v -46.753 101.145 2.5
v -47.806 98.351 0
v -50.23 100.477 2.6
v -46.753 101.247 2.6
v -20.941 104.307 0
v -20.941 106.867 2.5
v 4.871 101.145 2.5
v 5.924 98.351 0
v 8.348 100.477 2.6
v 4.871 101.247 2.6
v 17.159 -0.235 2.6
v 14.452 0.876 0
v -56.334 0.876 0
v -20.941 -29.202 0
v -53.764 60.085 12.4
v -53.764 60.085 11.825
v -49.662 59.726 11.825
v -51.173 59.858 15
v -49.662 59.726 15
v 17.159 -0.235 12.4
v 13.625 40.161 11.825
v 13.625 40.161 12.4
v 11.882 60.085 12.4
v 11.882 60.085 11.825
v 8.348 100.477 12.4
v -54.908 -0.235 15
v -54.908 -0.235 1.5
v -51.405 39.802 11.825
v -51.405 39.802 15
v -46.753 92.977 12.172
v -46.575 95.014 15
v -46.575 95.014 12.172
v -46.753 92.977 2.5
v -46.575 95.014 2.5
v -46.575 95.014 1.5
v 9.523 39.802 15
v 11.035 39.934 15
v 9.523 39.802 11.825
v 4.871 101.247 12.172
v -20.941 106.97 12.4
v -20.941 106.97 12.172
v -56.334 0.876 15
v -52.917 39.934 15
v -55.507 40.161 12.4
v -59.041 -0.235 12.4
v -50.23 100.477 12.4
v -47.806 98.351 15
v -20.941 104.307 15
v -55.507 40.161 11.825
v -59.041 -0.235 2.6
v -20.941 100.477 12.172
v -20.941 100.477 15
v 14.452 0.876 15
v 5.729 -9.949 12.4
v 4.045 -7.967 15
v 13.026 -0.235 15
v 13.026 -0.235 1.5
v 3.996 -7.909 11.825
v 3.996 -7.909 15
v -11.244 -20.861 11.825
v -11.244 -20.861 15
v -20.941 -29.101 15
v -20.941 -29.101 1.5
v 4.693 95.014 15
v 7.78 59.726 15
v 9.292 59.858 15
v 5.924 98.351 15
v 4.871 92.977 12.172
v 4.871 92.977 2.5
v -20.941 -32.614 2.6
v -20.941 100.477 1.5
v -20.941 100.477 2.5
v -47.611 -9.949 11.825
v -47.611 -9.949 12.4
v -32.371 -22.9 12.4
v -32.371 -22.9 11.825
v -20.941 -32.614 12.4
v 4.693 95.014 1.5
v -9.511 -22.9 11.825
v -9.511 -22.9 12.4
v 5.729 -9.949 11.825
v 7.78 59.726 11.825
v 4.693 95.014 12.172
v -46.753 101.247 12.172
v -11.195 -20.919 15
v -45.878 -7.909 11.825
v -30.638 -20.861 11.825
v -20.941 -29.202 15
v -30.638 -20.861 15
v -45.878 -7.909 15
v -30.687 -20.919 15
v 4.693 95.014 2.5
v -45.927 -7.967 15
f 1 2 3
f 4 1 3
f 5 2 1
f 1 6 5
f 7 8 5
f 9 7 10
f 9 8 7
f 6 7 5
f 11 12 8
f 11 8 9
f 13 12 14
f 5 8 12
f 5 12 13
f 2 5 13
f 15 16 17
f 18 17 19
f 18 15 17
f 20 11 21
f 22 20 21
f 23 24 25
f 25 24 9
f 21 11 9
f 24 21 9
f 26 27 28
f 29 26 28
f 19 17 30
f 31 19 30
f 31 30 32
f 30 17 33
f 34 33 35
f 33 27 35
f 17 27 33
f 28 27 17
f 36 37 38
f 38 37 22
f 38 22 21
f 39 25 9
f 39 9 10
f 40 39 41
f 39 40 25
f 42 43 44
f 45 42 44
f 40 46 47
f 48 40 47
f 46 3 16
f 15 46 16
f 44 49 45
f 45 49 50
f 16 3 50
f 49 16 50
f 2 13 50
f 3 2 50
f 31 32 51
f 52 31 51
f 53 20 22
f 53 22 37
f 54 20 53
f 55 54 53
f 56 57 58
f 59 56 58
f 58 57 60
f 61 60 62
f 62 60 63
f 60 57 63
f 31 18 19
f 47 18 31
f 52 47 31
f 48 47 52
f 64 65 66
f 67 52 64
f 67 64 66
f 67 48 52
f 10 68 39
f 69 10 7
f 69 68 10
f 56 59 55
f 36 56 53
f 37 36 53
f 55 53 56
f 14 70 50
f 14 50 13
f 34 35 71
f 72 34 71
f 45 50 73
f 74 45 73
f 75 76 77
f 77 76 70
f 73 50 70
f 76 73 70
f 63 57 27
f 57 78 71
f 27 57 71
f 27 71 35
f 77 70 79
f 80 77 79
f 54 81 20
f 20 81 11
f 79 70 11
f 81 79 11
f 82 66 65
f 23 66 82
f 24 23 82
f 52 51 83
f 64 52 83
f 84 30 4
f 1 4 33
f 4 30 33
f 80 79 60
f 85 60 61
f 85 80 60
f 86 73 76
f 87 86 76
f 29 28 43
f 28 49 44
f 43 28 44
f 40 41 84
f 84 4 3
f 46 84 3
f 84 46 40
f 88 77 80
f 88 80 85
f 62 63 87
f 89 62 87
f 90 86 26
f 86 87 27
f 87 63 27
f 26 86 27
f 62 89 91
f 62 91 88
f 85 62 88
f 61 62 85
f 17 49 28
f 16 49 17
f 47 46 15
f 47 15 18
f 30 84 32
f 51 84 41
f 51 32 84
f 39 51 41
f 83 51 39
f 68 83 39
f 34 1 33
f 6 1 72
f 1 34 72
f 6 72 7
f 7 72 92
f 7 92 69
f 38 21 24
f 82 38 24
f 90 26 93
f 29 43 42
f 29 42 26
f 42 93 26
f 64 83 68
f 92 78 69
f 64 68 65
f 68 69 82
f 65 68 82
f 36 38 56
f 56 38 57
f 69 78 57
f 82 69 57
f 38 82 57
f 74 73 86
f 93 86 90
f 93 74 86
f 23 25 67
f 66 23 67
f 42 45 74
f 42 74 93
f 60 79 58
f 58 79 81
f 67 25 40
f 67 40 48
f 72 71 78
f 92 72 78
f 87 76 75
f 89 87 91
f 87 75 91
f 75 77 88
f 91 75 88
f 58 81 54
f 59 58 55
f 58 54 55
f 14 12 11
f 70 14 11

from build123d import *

# Parameters (mm, degrees)
BOSS_EXTRUDE1_DEPTH = 15
BOSS_EXTRUDE2_DEPTH = 1.5
SKETCH4_W           = 51.62387155
SKETCH4_H           = 9.672418812
CUT_EXTRUDE2_DEPTH  = 144.5
SKETCH9_W           = 20
SKETCH9_H           = 3.175
CUT_EXTRUDE3_DEPTH  = 5.5
SKETCH6_W           = 3.175
SKETCH6_H           = 20
CUT_EXTRUDE4_DEPTH  = 5.5
SKETCH8_W           = 20
SKETCH8_H           = 3.175
CUT_EXTRUDE5_DEPTH  = 5.5
SKETCH7_W           = 3.175
SKETCH7_H           = 20
CUT_EXTRUDE6_DEPTH  = 5.5
CHAMFER1_SIZE       = 2.6


with BuildPart() as part:
    # Sketch1 → Boss-Extrude1 (new body)
    with BuildSketch(Plane.XY):
        Polygon((-59.040836406, -0.235043033), (-20.940836406, -32.613894155), (17.159163594, -0.235043033), (8.348043807, 100.476516972), (-20.940836406, 106.96970539), (-50.22971662, 100.476516972), align=None)
        Polygon((-46.574564783, 95.01395338), (-20.940836406, 100.476516972), (4.69289197, 95.01395338), (13.026099369, -0.235043033), (-20.940836406, -29.10145659), (-54.907772181, -0.235043033), align=None, mode=Mode.SUBTRACT)
    extrude(amount=BOSS_EXTRUDE1_DEPTH)

    # Sketch1<6> → Boss-Extrude2 (add)
    with BuildSketch(Plane.XY):
        Polygon((-54.907772181, -0.235043033), (-46.574564783, 95.01395338), (-20.940836406, 100.476516972), (4.69289197, 95.01395338), (13.026099369, -0.235043033), (-20.940836406, -29.10145659), align=None)
    extrude(amount=BOSS_EXTRUDE2_DEPTH)

    # Sketch4 → Cut-Extrude2 (cut)
    with BuildSketch(Plane(origin=(0, 0, 0), x_dir=(1, 0, 0), z_dir=(0, 1, 0))):
        with Locations((-20.940836406, -7.336209406)):
            Rectangle(SKETCH4_W, SKETCH4_H)
    extrude(amount=CUT_EXTRUDE2_DEPTH, mode=Mode.SUBTRACT)

    # Sketch9 → Cut-Extrude3 (cut)
    with BuildSketch(Plane(origin=(7.31178106, -8.603728938, 0), x_dir=(0.7619999999999999, 0.6475770224459791, 0), z_dir=(0.6475770224459791, -0.7619999999999999, 0))):
        with Locations((-12.076925809, 13.4125)):
            Rectangle(SKETCH9_W, SKETCH9_H)
    extrude(amount=-CUT_EXTRUDE3_DEPTH, mode=Mode.SUBTRACT)

    # Sketch6 → Cut-Extrude4 (cut)
    with BuildSketch(Plane(origin=(17.008413071, 1.488043328, 0), x_dir=(0, 0, -1), z_dir=(0.9961946980917459, 0.08715574274765506, 0))):
        with Locations((-13.4125, 48.820331729)):
            Rectangle(SKETCH6_W, SKETCH6_H)
    extrude(amount=-CUT_EXTRUDE4_DEPTH, mode=Mode.SUBTRACT)

    # Sketch8 → Cut-Extrude5 (cut)
    with BuildSketch(Plane(origin=(-24.875111844, -29.270394977, 0), x_dir=(0.7620000000000001, -0.6475770224459789, 0), z_dir=(-0.6475770224459789, -0.7620000000000001, 0))):
        with Locations((-19.836908874, 13.4125)):
            Rectangle(SKETCH8_W, SKETCH8_H)
    extrude(amount=-CUT_EXTRUDE5_DEPTH, mode=Mode.SUBTRACT)

    # Sketch7 → Cut-Extrude6 (cut)
    with BuildSketch(Plane(origin=(-58.571947524, 5.124381409, 0), x_dir=(0, 0, 1), z_dir=(-0.996194698091746, 0.0871557427476544, 0))):
        with Locations((13.4125, 45.170103428)):
            Rectangle(SKETCH7_W, SKETCH7_H)
    extrude(amount=-CUT_EXTRUDE6_DEPTH, mode=Mode.SUBTRACT)

    # Chamfer1
    # the kernel refuses this chamfer: 2.6 mm, written as the material it takes off along each edge
    with BuildSketch(Plane(origin=(-14.412954441, 108.41690198, 0), x_dir=(0.2163577817803448, -0.9759268861100734, -0.027495876610586355), z_dir=(-0.976296007119934, -0.21643961393810024, 0)), Plane(origin=(-14.412954441, 108.41690198, 15), x_dir=(-0.0059511969184851, 0.026844114547178517, -0.9996219169112966), z_dir=(-0.976296007119934, -0.21643961393810024, 0)), Plane(origin=(14.875925773, 99.029320382, 15), x_dir=(0.0059511969184853734, 0.026844114547178898, -0.9996219169112966), z_dir=(-0.9762960071199325, 0.2164396139381068, 0)), Plane(origin=(14.875925773, 99.029320382, 0), x_dir=(-0.21635778178035134, -0.9759268861100718, -0.027495876610586386), z_dir=(-0.9762960071199325, 0.2164396139381068, 0))) as chamfer1_piece_1:
        Polygon((CHAMFER1_SIZE * 0.999621916911, CHAMFER1_SIZE * 0.0274958766106), (-CHAMFER1_SIZE * 0.0274958766106, CHAMFER1_SIZE * 0.999621916911), (0, 0), align=None)
    extrude(amount=43.372751537, mode=Mode.SUBTRACT)
    with BuildSketch(Plane(origin=(-49.646960573, 107.137449062, 0), x_dir=(0.9958180537233415, -0.0871227906352381, -0.02749587661058639), z_dir=(-0.08715574274765436, -0.9961946980917459, 0)), Plane(origin=(17.74191964, -6.895975123, 0), x_dir=(-0.9958180537233413, -0.08712279063523876, -0.027495876610586372), z_dir=(-0.08715574274765503, 0.9961946980917459, 0))) as chamfer1_piece_2:
        Polygon((CHAMFER1_SIZE * 0.999621916911, CHAMFER1_SIZE * 0.0274958766106), (-CHAMFER1_SIZE * 0.0274958766106, CHAMFER1_SIZE * 0.999621916911), (0, 0), align=None)
    extrude(amount=114.46901334, mode=Mode.SUBTRACT)
    with BuildSketch(Plane(origin=(-64.135854742, 4.094900279, 0), x_dir=(-0.017805697905026136, -0.02095185797726749, 0.9996219169112966), z_dir=(0.762, -0.6475770224459791, 0))) as chamfer1_piece_3:
        Polygon((CHAMFER1_SIZE * 0.999621916911, -CHAMFER1_SIZE * 0.0274958766106), (-CHAMFER1_SIZE * 0.0274958766106, -CHAMFER1_SIZE * 0.999621916911), (0, 0), align=None)
    extrude(amount=63.372751537, mode=Mode.SUBTRACT)
    with BuildSketch(Plane(origin=(-26.035854742, -36.943837466, 0), x_dir=(-0.6473321845251594, 0.761711900686408, -0.027495876610586337), z_dir=(0.762, 0.6475770224459791, 0))) as chamfer1_piece_4:
        Polygon((CHAMFER1_SIZE * 0.999621916911, CHAMFER1_SIZE * 0.0274958766106), (-CHAMFER1_SIZE * 0.0274958766106, CHAMFER1_SIZE * 0.999621916911), (0, 0), align=None)
    extrude(amount=63.372751537, mode=Mode.SUBTRACT)
    with BuildSketch(Plane(origin=(-26.035854742, -36.943837466, 15), x_dir=(0.017805697905026178, -0.02095185797726754, -0.9996219169112966), z_dir=(0.762, 0.6475770224459791, 0)), Plane(origin=(-37.465854742, -18.570295507, 15), x_dir=(-0.017805697905026636, -0.020951857977268076, -0.9996219169112966), z_dir=(0.762, -0.6475770224459791, 0)), Plane(origin=(-64.135854742, 4.094900279, 15), x_dir=(-0.017805697905026147, -0.0209518579772675, -0.9996219169112966), z_dir=(0.762, -0.6475770224459791, 0)), Plane(origin=(0.634145258, -14.278641681, 15), x_dir=(0.017805697905025515, -0.020951857977266758, -0.9996219169112966), z_dir=(0.762, 0.6475770224459791, 0))) as chamfer1_piece_5:
        Polygon((CHAMFER1_SIZE * 0.999621916911, CHAMFER1_SIZE * 0.0274958766106), (-CHAMFER1_SIZE * 0.0274958766106, CHAMFER1_SIZE * 0.999621916911), (0, 0), align=None)
    extrude(amount=28.372751537, mode=Mode.SUBTRACT)
    with BuildSketch(Plane(origin=(-54.923914991, 46.821584065, 15), x_dir=(0.9958180537233415, -0.0871227906352381, 0.027495876610586705), z_dir=(-0.08715574274765436, -0.9961946980917459, 0))) as chamfer1_piece_6:
        Polygon((CHAMFER1_SIZE * 0.999621916911, -CHAMFER1_SIZE * 0.0274958766106), (-CHAMFER1_SIZE * 0.0274958766106, -CHAMFER1_SIZE * 0.999621916911), (0, 0), align=None)
    extrude(amount=53.922751537, mode=Mode.SUBTRACT)
    with BuildSketch(Plane(origin=(-49.646960573, 107.137449062, 15), x_dir=(-0.02739124649885124, 0.002396423548493534, -0.9996219169112966), z_dir=(-0.08715574274765436, -0.9961946980917459, 0)), Plane(origin=(12.464639417, 53.423613846, 15), x_dir=(0.027391246498851204, 0.0023964235484935496, -0.9996219169112966), z_dir=(-0.08715574274765503, 0.9961946980917459, 0))) as chamfer1_piece_7:
        Polygon((CHAMFER1_SIZE * 0.999621916911, CHAMFER1_SIZE * 0.0274958766106), (-CHAMFER1_SIZE * 0.0274958766106, CHAMFER1_SIZE * 0.999621916911), (0, 0), align=None)
    extrude(amount=53.91901334, mode=Mode.SUBTRACT)
    with BuildSketch(Plane(origin=(17.74191964, -6.895975123, 15), x_dir=(0.027391246498850576, 0.0023964235484934945, -0.9996219169112966), z_dir=(-0.08715574274765503, 0.9961946980917459, 0))) as chamfer1_piece_8:
        Polygon((CHAMFER1_SIZE * 0.999621916911, CHAMFER1_SIZE * 0.0274958766106), (-CHAMFER1_SIZE * 0.0274958766106, CHAMFER1_SIZE * 0.999621916911), (0, 0), align=None)
    extrude(amount=53.922751537, mode=Mode.SUBTRACT)


solid = part.part
